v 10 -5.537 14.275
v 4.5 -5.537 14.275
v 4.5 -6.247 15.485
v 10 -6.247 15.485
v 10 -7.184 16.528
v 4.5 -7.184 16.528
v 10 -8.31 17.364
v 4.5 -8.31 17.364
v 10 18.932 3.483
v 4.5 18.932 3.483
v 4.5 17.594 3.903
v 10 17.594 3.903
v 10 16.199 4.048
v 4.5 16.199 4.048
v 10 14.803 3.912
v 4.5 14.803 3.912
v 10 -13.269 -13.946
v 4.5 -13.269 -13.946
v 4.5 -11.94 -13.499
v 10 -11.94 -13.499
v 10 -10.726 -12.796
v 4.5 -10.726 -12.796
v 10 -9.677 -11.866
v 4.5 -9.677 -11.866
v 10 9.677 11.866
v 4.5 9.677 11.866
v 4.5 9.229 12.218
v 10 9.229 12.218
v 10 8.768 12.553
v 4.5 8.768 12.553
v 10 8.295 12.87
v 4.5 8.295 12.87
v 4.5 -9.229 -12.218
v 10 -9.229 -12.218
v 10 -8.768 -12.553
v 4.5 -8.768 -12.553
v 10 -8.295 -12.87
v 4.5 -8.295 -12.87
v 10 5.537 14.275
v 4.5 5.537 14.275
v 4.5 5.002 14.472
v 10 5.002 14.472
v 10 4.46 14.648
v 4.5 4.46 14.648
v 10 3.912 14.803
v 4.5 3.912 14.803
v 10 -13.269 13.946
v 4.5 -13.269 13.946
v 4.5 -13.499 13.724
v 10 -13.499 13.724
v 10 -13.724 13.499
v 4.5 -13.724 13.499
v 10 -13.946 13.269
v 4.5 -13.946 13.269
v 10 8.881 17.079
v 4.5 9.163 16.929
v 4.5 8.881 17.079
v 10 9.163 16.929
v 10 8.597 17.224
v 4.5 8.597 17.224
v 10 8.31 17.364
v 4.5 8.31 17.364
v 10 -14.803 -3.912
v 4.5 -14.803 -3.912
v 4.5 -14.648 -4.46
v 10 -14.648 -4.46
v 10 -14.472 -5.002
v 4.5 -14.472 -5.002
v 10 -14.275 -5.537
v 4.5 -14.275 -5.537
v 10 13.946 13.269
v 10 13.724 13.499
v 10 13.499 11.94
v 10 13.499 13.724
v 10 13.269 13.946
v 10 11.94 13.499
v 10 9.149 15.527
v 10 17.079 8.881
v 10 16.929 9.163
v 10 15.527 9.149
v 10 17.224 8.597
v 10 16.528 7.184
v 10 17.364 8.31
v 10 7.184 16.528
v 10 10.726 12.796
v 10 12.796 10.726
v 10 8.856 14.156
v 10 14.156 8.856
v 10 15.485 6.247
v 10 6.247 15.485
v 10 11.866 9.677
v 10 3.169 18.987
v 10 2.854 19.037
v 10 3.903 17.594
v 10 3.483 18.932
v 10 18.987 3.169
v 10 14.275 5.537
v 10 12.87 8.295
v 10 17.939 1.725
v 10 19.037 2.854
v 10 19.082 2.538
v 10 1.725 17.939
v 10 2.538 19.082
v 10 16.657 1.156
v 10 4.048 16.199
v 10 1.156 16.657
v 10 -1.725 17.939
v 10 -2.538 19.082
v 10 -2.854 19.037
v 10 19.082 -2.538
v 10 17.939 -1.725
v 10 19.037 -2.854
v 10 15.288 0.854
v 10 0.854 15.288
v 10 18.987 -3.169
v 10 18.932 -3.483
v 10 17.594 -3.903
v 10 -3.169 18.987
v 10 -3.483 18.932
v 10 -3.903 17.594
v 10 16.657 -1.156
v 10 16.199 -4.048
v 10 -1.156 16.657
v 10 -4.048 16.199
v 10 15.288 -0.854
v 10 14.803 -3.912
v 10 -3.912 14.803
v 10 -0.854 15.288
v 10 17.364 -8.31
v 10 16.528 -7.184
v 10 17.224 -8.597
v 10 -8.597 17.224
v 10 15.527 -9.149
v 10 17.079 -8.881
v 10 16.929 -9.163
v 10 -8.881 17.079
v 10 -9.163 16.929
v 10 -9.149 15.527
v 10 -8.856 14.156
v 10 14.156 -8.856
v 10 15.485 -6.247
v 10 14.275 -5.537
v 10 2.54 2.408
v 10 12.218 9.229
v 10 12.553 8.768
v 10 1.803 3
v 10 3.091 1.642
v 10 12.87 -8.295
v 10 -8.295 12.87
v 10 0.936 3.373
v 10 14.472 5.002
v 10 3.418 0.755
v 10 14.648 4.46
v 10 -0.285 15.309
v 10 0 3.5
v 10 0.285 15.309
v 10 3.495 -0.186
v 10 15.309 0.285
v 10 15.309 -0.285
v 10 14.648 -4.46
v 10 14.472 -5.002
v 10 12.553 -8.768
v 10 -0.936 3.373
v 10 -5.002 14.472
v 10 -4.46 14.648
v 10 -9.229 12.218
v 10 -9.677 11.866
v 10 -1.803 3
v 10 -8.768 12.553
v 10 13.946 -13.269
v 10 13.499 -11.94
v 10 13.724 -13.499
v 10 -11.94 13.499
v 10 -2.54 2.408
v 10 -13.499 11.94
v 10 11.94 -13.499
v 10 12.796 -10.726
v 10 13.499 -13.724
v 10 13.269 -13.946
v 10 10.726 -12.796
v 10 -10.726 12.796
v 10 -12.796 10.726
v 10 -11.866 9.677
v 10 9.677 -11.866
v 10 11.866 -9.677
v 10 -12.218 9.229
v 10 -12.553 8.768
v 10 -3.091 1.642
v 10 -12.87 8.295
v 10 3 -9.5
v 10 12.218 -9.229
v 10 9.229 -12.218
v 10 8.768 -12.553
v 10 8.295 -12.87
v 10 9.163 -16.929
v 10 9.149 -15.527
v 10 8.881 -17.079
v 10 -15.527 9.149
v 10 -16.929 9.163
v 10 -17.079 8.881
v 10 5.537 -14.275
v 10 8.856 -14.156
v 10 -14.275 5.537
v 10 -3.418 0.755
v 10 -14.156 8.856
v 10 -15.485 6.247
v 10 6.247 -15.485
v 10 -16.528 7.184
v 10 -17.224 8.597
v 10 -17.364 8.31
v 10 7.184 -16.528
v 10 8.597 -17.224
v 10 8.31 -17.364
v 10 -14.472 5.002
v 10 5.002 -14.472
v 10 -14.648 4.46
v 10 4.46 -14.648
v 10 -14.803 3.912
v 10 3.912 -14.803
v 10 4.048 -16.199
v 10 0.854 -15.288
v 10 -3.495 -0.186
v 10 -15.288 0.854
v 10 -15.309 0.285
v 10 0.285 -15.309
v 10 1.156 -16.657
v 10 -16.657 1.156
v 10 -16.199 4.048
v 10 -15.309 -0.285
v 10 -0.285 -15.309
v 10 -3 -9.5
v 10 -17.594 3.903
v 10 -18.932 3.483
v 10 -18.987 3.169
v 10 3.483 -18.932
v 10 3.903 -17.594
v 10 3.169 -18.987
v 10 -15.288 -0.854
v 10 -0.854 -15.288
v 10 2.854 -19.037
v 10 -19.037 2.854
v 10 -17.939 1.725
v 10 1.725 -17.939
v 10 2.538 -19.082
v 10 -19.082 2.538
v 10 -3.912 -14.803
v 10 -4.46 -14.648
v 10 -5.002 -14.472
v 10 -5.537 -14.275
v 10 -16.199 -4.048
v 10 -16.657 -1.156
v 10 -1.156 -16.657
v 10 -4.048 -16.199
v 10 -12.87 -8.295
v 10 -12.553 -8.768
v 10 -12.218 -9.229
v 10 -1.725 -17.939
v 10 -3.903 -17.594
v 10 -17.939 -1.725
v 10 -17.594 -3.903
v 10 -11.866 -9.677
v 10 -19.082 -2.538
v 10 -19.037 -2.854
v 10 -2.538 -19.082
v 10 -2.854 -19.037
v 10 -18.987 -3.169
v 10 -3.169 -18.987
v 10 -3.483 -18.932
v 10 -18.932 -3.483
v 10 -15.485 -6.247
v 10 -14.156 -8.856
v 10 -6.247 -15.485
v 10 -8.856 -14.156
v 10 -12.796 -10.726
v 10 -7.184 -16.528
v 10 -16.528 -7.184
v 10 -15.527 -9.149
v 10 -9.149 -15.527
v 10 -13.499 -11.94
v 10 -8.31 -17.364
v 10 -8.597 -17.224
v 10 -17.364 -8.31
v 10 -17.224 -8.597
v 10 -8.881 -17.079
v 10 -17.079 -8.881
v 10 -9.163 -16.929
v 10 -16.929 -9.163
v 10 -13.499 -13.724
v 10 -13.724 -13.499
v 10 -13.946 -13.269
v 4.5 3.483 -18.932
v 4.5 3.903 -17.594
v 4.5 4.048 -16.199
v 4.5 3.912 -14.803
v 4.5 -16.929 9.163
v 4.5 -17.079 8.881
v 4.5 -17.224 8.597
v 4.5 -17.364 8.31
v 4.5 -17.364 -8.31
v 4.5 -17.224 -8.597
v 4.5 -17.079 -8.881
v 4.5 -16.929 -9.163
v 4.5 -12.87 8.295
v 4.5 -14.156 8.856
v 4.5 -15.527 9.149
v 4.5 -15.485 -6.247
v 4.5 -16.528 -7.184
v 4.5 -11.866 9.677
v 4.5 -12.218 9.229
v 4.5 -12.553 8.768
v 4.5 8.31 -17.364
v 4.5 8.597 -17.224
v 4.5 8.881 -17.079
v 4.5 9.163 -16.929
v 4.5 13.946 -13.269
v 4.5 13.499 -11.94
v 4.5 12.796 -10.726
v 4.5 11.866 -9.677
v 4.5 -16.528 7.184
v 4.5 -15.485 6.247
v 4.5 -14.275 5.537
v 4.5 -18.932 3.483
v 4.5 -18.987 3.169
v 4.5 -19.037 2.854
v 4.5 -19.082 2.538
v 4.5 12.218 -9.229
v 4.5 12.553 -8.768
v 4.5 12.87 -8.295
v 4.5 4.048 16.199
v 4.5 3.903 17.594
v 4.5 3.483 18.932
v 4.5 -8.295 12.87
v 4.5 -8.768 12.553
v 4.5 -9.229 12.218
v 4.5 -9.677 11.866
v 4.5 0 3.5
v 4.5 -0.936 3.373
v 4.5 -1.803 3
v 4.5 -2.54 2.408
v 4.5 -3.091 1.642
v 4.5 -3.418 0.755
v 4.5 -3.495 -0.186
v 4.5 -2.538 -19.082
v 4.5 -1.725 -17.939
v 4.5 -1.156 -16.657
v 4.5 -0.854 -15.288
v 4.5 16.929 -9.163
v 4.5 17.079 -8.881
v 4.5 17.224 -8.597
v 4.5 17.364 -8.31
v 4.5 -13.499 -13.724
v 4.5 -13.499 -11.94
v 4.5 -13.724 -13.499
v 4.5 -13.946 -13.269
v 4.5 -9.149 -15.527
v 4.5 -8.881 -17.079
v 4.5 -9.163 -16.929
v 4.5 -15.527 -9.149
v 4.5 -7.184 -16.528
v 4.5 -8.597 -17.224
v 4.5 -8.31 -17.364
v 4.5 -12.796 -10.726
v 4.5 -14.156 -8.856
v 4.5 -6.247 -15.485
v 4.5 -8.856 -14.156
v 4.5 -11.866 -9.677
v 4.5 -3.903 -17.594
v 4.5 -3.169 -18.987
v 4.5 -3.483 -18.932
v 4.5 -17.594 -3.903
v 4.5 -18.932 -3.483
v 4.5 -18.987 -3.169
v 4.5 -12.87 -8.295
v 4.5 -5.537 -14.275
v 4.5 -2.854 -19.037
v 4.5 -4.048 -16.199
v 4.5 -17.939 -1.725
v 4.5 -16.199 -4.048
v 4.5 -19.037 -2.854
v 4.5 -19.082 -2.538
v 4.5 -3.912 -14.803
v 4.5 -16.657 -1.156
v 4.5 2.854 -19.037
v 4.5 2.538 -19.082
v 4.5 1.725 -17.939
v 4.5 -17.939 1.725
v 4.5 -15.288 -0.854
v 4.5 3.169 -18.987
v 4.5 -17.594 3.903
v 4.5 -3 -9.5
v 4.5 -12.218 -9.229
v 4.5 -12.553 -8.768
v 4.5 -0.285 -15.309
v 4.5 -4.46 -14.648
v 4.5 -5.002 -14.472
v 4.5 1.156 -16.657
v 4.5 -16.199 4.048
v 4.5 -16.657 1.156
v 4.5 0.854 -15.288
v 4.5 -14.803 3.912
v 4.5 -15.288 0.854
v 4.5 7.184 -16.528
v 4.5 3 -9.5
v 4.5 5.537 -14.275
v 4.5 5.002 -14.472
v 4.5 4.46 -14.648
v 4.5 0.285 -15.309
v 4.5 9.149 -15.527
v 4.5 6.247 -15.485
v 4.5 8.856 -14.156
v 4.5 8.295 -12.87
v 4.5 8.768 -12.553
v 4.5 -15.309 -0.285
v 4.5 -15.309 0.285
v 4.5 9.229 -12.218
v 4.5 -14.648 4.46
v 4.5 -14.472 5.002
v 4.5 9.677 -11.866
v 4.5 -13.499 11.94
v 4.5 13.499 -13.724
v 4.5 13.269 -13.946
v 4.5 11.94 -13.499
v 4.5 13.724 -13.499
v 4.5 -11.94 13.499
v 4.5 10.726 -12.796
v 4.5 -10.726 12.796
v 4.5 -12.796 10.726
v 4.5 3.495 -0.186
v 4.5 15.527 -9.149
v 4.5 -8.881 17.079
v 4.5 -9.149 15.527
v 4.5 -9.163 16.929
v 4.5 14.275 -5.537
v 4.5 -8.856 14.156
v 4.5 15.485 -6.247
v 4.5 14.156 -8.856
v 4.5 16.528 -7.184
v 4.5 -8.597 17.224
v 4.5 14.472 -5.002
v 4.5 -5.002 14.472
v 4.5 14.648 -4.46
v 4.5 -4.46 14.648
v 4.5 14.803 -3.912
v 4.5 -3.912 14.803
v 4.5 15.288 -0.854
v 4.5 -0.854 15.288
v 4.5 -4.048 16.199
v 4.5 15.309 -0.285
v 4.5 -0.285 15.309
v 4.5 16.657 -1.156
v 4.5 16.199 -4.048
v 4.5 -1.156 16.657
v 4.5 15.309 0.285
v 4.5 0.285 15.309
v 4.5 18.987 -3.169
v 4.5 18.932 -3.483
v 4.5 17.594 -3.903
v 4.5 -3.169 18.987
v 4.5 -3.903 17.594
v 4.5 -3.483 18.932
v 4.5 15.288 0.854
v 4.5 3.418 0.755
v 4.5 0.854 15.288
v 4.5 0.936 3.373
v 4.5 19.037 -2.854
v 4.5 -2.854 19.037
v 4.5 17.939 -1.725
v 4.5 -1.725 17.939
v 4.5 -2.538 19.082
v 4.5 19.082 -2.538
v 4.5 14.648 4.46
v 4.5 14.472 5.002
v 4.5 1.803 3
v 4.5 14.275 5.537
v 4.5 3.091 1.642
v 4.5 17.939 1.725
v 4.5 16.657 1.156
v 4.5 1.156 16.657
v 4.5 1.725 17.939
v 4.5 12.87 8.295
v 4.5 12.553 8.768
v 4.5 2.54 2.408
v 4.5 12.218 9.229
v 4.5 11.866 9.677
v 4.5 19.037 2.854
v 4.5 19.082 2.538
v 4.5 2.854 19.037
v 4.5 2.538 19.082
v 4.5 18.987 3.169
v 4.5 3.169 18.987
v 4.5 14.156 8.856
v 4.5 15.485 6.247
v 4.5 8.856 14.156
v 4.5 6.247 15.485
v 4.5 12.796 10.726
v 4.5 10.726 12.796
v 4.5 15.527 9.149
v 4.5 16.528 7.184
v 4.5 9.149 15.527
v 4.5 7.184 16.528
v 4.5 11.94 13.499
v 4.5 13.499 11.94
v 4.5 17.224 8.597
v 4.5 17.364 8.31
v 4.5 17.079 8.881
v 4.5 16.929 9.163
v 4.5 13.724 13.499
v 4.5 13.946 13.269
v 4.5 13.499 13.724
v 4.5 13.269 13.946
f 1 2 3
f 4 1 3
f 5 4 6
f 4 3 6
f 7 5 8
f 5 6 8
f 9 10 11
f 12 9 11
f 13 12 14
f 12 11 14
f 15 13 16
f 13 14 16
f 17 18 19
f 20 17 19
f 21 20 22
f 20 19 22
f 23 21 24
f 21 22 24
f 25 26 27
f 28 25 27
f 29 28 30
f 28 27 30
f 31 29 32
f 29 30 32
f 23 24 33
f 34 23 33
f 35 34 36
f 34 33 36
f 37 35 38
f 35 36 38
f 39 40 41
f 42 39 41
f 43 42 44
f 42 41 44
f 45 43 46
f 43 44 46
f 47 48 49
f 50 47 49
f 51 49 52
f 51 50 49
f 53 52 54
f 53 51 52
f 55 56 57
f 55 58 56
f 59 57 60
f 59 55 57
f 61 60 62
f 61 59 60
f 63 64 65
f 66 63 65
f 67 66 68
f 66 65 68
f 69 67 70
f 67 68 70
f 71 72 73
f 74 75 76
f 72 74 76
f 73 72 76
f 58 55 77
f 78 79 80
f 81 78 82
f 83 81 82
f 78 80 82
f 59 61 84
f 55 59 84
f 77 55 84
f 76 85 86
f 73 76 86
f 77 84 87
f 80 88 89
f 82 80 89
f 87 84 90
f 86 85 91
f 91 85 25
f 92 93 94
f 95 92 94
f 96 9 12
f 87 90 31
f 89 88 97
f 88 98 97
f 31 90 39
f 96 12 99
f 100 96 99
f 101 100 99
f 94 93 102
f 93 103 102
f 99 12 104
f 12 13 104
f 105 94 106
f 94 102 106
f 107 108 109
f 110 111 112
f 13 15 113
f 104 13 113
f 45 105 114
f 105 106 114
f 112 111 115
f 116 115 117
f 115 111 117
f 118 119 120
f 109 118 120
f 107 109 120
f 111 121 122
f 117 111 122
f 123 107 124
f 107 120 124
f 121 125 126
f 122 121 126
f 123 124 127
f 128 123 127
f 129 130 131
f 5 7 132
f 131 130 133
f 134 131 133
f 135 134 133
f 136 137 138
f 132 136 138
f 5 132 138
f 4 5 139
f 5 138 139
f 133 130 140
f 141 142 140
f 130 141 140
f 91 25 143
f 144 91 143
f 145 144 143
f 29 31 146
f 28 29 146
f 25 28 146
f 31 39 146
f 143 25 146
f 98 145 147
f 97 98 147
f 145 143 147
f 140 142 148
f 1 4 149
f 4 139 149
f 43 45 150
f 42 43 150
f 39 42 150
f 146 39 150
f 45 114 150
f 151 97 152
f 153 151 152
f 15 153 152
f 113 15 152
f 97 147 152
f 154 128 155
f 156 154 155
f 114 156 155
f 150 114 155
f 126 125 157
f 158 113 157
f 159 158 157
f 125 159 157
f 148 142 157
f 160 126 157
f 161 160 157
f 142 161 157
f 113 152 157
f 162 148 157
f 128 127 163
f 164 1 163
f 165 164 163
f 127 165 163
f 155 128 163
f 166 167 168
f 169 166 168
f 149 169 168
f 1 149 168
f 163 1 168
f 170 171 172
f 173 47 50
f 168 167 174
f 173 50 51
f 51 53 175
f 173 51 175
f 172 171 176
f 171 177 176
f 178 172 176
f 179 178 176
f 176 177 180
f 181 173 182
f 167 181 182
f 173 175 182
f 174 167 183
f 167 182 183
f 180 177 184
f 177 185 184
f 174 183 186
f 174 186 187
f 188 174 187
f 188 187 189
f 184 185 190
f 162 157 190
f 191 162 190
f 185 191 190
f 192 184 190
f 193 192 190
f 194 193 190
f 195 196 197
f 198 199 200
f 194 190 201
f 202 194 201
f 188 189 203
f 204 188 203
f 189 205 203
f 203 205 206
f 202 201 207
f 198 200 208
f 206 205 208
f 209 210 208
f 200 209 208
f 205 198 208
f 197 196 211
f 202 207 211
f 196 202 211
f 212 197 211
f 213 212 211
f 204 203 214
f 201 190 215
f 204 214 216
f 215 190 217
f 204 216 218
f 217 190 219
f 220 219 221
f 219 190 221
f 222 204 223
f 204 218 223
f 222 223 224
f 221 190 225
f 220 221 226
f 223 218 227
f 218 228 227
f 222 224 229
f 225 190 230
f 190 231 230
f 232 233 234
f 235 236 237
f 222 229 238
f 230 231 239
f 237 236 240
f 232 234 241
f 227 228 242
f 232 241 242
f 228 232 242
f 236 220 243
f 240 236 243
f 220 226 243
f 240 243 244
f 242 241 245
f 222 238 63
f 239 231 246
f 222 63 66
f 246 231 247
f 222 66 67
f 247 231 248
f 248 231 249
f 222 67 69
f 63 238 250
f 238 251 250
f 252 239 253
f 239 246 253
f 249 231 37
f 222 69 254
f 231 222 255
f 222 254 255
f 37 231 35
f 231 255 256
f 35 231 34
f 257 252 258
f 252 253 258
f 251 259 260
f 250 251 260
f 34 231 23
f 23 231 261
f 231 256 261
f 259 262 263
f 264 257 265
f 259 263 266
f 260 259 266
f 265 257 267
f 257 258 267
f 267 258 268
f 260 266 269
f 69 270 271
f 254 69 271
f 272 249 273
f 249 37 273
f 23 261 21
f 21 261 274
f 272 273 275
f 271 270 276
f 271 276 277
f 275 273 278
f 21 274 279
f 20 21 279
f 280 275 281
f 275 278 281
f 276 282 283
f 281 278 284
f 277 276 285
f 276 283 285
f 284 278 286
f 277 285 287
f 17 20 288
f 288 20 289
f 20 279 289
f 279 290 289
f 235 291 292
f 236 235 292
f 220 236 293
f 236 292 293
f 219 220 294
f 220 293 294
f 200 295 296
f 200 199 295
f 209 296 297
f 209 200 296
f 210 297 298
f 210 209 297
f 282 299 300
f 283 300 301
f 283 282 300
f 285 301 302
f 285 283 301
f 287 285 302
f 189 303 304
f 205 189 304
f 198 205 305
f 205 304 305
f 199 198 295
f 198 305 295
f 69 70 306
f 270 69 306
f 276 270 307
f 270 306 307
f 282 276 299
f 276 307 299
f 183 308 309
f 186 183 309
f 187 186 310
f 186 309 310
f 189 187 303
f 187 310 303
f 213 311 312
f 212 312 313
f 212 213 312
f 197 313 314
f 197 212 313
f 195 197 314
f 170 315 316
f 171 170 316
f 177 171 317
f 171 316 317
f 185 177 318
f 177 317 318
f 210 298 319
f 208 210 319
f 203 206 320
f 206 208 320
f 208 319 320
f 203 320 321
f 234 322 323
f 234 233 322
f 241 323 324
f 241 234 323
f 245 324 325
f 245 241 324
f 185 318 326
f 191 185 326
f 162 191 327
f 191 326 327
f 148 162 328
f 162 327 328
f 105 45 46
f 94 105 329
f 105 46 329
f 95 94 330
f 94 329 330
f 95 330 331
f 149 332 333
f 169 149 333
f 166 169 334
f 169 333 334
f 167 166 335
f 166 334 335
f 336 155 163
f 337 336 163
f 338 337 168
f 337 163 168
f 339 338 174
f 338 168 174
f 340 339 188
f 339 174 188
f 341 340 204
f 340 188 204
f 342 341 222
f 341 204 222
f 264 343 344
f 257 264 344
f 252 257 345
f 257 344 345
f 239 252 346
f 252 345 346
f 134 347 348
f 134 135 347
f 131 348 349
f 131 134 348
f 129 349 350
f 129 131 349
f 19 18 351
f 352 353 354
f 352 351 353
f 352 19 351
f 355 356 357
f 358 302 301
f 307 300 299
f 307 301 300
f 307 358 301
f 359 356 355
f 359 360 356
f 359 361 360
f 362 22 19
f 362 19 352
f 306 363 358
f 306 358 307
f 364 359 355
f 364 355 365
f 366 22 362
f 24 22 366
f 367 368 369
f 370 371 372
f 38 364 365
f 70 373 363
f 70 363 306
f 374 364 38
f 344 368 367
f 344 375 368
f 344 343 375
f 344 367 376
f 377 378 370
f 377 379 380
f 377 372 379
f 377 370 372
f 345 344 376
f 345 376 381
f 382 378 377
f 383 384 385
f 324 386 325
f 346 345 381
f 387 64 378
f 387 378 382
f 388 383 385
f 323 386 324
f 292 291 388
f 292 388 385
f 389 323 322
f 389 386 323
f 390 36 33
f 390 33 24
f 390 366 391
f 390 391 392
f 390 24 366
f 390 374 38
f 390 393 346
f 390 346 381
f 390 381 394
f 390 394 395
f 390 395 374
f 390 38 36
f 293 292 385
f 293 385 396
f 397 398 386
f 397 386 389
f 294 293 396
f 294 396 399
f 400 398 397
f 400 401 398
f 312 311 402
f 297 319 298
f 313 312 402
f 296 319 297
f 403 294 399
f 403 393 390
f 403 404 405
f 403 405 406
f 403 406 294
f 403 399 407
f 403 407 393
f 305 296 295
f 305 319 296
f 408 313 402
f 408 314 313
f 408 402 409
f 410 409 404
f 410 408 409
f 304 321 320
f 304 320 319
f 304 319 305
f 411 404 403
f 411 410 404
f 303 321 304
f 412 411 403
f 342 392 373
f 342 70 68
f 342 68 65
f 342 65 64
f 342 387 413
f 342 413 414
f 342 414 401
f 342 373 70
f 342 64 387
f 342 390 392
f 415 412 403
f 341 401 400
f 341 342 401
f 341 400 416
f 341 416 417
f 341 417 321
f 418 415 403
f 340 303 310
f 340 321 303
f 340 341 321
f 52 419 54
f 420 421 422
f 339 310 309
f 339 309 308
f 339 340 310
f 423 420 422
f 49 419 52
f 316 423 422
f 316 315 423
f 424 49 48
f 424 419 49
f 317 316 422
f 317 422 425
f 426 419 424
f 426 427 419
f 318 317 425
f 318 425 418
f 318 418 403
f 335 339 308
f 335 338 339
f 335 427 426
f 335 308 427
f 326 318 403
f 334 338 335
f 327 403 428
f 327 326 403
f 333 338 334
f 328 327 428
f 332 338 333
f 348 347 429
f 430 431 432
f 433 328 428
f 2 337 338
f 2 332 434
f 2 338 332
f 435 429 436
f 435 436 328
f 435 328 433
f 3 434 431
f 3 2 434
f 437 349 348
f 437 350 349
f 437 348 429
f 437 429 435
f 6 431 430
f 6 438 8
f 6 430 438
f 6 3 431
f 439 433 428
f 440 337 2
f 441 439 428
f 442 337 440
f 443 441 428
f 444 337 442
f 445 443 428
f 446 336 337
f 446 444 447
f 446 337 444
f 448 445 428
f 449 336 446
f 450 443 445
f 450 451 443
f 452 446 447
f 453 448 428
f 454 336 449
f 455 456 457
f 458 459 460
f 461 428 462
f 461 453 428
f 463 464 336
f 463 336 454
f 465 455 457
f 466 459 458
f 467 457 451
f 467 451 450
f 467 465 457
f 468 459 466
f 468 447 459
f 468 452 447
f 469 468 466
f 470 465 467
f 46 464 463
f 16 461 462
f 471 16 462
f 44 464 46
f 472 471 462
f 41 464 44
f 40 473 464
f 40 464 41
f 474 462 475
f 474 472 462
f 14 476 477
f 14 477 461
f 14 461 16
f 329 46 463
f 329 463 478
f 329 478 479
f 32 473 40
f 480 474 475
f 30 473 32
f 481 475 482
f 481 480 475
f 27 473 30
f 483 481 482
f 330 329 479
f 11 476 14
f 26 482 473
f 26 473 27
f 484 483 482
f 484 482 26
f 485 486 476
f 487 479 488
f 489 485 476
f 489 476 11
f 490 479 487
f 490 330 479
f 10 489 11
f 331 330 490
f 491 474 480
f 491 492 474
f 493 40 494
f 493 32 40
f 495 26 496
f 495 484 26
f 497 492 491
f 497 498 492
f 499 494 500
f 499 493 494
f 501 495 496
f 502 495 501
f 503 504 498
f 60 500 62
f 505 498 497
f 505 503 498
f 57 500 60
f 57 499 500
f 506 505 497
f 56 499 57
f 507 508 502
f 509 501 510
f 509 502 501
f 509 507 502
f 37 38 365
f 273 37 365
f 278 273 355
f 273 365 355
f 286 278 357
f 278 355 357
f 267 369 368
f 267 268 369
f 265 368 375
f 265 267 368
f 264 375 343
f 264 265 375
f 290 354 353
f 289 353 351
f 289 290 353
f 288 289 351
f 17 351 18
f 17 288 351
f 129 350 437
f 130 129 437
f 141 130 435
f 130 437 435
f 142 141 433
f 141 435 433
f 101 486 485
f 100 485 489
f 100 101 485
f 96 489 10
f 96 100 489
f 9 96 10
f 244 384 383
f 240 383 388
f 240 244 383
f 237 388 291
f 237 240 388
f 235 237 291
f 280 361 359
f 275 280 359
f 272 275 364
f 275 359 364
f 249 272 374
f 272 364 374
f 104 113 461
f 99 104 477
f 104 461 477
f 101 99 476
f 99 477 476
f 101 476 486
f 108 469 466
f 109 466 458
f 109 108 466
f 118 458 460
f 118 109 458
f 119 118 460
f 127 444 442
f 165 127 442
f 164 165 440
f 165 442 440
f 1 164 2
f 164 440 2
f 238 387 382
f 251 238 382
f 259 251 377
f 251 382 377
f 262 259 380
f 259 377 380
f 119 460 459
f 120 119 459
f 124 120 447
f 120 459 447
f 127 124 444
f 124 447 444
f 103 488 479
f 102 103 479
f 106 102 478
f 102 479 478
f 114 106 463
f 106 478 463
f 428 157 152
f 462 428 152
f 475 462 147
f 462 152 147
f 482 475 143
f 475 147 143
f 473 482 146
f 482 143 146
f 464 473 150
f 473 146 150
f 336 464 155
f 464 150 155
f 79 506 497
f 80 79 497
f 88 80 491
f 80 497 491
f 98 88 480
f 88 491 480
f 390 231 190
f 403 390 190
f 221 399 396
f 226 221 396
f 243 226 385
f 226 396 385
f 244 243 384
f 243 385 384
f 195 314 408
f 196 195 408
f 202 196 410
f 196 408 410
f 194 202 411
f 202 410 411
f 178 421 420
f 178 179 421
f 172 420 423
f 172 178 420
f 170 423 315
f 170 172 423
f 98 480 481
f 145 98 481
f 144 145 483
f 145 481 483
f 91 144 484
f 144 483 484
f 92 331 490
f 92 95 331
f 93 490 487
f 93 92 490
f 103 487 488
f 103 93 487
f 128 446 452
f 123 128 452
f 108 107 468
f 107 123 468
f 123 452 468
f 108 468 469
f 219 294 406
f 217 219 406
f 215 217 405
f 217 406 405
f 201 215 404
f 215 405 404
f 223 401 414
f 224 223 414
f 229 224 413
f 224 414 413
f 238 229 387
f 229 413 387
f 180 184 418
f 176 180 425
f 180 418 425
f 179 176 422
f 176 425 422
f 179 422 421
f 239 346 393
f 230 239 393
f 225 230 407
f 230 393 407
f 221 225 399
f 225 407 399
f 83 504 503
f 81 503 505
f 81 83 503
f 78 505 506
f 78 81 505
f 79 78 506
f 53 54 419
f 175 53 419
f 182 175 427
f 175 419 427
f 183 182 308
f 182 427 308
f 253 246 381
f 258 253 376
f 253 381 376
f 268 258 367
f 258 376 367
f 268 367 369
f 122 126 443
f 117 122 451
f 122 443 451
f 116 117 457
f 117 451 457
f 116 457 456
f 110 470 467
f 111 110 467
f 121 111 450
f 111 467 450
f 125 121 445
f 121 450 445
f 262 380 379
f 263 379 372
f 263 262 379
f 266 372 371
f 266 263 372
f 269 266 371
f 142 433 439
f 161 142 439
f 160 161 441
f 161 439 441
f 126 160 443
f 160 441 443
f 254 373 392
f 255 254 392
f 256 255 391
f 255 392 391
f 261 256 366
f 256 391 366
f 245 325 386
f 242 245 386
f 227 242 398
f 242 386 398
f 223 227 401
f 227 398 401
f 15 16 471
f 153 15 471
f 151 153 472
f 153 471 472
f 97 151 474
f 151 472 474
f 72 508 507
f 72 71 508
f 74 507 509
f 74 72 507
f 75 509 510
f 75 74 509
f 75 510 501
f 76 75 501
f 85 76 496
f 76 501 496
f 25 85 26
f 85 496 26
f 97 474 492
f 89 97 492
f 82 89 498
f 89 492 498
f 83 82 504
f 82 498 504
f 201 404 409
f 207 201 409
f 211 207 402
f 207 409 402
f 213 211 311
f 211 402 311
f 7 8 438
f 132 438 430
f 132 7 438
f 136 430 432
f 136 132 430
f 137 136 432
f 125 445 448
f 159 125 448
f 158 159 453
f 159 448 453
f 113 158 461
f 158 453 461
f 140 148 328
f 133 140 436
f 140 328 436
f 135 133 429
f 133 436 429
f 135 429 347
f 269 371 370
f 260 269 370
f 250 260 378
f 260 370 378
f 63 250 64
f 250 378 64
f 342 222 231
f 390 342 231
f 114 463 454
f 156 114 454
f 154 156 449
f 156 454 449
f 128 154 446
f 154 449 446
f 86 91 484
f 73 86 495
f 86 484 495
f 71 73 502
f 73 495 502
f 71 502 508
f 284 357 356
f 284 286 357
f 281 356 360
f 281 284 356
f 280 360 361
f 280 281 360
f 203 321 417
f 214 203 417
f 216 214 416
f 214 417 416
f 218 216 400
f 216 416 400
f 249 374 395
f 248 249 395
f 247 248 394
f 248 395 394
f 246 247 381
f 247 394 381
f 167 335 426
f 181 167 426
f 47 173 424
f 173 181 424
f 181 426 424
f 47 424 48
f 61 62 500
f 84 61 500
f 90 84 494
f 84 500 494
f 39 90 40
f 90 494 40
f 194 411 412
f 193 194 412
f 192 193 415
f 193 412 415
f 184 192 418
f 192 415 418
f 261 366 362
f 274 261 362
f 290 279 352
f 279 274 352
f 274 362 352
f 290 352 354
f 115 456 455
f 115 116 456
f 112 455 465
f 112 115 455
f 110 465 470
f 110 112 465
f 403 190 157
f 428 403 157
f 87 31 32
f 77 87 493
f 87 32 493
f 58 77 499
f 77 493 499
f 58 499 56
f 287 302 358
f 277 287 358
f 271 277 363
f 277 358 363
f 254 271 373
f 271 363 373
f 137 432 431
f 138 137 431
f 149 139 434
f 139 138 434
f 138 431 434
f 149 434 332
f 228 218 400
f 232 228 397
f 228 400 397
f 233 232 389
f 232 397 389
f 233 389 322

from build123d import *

# Parameters (mm, degrees)
BASPROSKE_W         = 10
BASPROSKE_H         = 19.25
TOOTHCUT_DEPTH      = 30.002155092
TEETHCUTS_COUNT     = 20
TEETHCUTS_ANGLE     = 342
BORSKE_R            = 0.4
BORE_DEPTH          = 50.0000508
SKETCH1_R           = 2.5
CUT_EXTRUDE1_DEPTH  = 29.779222719
CUT_EXTRUDE_1_DEPTH = 5.5
SKETCH_4_R          = 25
CUT_EXTRUDE_2_DEPTH = 4.5


with BuildPart() as part:
    # BasProSke → Base-Revolve (revolve)
    with BuildSketch(Plane(origin=(0, 0, 0), x_dir=(1, 0, 0), z_dir=(0, 1, 0)), mode=Mode.PRIVATE) as base_revolve_sk:
        with Locations((5, 9.625)):
            Rectangle(BASPROSKE_W, BASPROSKE_H)
    revolve(base_revolve_sk.sketch.rotate(Axis((-10, 0, 0), (1, 0, 0)), 180), axis=Axis((-10, 0, 0), (1, 0, 0)))

    # TooCutSke → ToothCut (cut, through all)
    with BuildSketch(Plane(origin=(0, 0, 0), x_dir=(0, 0, -1), z_dir=(1, 0, 0))):
        with BuildLine():
            ThreePointArc((0.85426341, 15.287650777), (0, 15.3115), (-0.85426341, 15.287650777))
            ThreePointArc((-0.85426341, 15.287650777), (-1.414533498, 17.326428412), (-2.557997552, 19.104912815))
            ThreePointArc((-2.557997552, 19.104912815), (0, 19.2754), (2.557997552, 19.104912815))
            ThreePointArc((2.557997552, 19.104912815), (1.414533498, 17.326428412), (0.85426341, 15.287650777))
        make_face()
    toothcut = extrude(amount=TOOTHCUT_DEPTH, mode=Mode.SUBTRACT)

    # TeethCuts: ToothCut ×20 about axis
    teethcuts_axis = Axis((-10, 0, 0), (1, 0, 0))
    for i in range(1, TEETHCUTS_COUNT):
        add(toothcut.rotate(teethcuts_axis, i * TEETHCUTS_ANGLE / (TEETHCUTS_COUNT - 1)), mode=Mode.SUBTRACT)

    # BorSke → Bore (cut, symmetric)
    with BuildSketch(Plane(origin=(0, 0, 0), x_dir=(0, 0, -1), z_dir=(1, 0, 0))):
        with Locations(Location((0, 0, 0), (0, 0, 180))):
            Circle(BORSKE_R)
    extrude(amount=BORE_DEPTH, both=True, mode=Mode.SUBTRACT)

    # Sketch1 → Cut-Extrude1 (cut, through all)
    with BuildSketch(Plane(origin=(10, 0, 0), x_dir=(0, 0, -1), z_dir=(1, 0, 0))):
        Circle(SKETCH1_R)
    extrude(amount=-CUT_EXTRUDE1_DEPTH, mode=Mode.SUBTRACT)

    # 草图2 → 切除-拉伸1 (cut)
    with BuildSketch(Plane(origin=(10, 0, 0), x_dir=(0, 0, -1), z_dir=(1, 0, 0))):
        with BuildLine():
            ThreePointArc((0.185768463, 3.495066534), (-2.408299232, 2.539703685), (-3.5, 0))
            Line((-3.5, 0), (9.5, 0))
            Line((9.5, 0), (9.5, 3))
            Line((9.5, 3), (0.185768463, 3.495066534))
        make_face()
        with BuildLine():
            Line((9.5, 0), (-3.5, 0))
            ThreePointArc((-3.5, 0), (-2.408299232, -2.539703685), (0.185768463, -3.495066534))
            Line((0.185768463, -3.495066534), (9.5, -3))
            Line((9.5, -3), (9.5, 0))
        make_face()
    extrude(amount=-CUT_EXTRUDE_1_DEPTH, mode=Mode.SUBTRACT)

    # 草图4 → 切除-拉伸2 (cut)
    with BuildSketch(Plane.ZY):
        Circle(SKETCH_4_R)
    extrude(amount=-CUT_EXTRUDE_2_DEPTH, mode=Mode.SUBTRACT)


solid = part.part
